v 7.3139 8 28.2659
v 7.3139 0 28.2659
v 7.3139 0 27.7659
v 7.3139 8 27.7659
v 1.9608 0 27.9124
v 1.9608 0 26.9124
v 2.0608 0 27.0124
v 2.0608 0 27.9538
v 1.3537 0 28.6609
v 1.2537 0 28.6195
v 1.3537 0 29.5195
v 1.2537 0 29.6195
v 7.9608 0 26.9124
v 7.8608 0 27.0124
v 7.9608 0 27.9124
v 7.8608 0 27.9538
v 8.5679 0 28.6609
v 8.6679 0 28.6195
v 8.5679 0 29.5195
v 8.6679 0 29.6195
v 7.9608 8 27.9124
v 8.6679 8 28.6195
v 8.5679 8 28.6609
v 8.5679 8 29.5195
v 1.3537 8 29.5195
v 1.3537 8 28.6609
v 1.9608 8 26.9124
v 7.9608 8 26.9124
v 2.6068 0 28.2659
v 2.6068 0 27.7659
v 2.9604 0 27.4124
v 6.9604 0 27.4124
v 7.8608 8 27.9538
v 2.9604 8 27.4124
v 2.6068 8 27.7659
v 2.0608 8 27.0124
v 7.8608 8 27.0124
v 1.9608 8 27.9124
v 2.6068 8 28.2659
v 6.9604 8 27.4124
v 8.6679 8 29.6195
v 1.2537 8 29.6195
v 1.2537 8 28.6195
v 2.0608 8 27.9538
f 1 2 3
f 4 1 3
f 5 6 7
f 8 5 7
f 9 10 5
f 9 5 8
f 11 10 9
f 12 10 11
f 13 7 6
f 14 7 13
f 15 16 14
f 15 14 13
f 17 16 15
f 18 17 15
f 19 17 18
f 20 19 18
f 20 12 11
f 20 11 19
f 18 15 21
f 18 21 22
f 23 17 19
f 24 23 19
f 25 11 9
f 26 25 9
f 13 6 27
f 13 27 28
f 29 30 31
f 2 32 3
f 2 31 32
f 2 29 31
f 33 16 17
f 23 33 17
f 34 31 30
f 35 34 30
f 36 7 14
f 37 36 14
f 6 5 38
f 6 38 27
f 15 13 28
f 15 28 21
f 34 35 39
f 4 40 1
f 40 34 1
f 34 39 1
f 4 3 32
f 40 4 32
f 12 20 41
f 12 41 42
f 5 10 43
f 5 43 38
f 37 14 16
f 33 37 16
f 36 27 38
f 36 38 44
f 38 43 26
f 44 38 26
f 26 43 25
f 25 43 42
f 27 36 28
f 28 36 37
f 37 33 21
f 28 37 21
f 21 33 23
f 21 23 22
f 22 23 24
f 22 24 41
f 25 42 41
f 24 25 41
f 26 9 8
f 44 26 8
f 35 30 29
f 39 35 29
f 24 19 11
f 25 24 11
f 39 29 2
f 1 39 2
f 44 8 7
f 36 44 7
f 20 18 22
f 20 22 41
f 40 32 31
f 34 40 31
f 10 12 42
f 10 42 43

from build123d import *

# Parameters (mm, degrees)
F1_DEPTH = 8
F3_DEPTH = 8


with BuildPart() as f1:
    # F0 (on Front) → F1 (new body)
    with BuildSketch(Plane.XZ):
        Polygon((1.960831, 27.912384), (1.960831, 26.912384), (7.960831, 26.912384), (7.960831, 27.912384), (8.667937, 28.619491), (8.667937, 29.619491), (1.253724, 29.619491), (1.253724, 28.619491), align=None)
    extrude(amount=-F1_DEPTH)

    # F2 (on face) → F3 (cut)
    with BuildSketch(Plane.XZ):
        Polygon((1.353724, 28.660912), (2.060831, 27.953805), (2.060831, 27.012384), (7.860831, 27.012384), (7.860831, 27.953805), (8.567937, 28.660912), (8.567937, 29.519491), (1.353724, 29.519491), align=None)
        Polygon((6.960384, 27.412384), (2.960384, 27.412384), (2.606831, 27.765937), (2.606831, 28.265937), (7.313937, 28.265937), (7.313937, 27.765937), align=None, mode=Mode.SUBTRACT)
    extrude(amount=-F3_DEPTH, mode=Mode.SUBTRACT)


solid = f1.part
